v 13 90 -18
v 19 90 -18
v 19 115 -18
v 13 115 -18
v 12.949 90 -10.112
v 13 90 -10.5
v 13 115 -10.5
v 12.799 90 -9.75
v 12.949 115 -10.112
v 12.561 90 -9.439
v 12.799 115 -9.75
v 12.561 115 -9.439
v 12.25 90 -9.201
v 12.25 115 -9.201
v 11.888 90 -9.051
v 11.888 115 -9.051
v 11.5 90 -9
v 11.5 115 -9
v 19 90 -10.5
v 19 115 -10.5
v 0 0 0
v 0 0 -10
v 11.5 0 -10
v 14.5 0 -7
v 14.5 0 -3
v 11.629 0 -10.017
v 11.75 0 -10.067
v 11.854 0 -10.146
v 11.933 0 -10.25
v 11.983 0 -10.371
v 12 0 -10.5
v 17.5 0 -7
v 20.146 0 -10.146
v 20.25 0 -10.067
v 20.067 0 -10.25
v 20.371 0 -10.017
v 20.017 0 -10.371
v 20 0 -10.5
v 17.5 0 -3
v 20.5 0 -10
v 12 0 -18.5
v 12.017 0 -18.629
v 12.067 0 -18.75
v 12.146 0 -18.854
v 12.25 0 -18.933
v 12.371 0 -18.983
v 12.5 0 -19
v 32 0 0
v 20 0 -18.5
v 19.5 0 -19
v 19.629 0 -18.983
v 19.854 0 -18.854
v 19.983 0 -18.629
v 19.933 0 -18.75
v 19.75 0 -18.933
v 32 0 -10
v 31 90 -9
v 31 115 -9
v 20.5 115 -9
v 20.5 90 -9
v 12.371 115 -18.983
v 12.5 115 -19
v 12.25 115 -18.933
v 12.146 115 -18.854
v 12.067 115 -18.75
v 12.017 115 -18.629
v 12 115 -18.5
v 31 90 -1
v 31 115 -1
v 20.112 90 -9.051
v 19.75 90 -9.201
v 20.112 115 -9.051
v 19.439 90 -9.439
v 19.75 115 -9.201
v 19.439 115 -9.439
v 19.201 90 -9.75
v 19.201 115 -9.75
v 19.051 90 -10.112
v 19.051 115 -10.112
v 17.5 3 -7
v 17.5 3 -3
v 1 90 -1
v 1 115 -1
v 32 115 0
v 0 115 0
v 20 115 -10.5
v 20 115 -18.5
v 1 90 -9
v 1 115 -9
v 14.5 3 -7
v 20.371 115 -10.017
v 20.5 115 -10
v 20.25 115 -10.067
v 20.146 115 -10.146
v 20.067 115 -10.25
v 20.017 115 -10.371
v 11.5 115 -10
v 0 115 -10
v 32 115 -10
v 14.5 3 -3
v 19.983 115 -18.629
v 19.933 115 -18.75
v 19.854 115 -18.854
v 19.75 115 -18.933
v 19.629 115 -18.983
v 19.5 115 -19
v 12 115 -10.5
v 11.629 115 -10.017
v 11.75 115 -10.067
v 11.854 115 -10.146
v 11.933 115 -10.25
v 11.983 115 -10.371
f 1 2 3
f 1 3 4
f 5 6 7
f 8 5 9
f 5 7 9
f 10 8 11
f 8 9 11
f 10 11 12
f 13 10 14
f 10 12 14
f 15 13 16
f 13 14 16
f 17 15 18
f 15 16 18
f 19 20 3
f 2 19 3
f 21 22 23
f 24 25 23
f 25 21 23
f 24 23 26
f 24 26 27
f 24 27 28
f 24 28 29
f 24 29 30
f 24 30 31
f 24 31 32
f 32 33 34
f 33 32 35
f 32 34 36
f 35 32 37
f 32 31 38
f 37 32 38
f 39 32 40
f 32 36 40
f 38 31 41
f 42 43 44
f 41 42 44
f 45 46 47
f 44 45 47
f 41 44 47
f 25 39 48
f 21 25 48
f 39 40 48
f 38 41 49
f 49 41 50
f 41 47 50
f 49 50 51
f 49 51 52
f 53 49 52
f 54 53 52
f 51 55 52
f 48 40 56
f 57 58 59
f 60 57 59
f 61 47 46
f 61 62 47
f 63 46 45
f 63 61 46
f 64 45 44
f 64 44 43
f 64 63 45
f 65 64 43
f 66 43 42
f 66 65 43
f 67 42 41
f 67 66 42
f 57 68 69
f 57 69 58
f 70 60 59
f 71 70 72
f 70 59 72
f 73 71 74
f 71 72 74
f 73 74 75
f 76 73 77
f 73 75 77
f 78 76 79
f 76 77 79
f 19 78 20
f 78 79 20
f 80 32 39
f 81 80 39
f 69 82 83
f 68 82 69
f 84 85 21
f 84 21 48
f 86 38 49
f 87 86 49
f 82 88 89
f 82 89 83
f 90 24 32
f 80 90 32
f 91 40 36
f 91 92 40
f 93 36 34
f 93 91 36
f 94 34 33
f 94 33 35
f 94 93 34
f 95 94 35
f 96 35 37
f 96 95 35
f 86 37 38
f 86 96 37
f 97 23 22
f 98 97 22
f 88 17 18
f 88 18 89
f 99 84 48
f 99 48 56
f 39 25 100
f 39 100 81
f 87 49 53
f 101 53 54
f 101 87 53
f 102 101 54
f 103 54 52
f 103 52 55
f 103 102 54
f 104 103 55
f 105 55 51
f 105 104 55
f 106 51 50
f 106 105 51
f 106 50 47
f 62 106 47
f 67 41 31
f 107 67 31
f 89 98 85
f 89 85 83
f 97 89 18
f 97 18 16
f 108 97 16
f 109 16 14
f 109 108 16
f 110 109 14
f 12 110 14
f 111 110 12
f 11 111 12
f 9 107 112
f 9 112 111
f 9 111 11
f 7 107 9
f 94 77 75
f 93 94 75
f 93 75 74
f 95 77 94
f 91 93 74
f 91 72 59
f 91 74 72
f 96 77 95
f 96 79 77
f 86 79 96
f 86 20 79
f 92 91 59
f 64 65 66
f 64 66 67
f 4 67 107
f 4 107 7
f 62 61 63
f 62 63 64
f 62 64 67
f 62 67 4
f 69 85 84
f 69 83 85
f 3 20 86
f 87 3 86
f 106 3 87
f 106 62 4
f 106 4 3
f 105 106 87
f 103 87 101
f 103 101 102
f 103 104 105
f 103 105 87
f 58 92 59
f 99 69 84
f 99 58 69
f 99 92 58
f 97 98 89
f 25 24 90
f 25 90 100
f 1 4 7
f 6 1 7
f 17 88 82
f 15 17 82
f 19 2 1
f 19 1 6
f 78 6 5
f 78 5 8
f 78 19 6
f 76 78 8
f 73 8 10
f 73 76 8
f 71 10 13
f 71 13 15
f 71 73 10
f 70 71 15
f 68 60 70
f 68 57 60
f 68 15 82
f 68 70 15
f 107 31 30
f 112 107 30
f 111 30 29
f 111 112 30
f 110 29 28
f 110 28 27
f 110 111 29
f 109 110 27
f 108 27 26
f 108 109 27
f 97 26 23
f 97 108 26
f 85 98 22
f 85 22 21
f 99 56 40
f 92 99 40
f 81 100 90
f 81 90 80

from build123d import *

# Parameters (mm, degrees)
BOSS_EXTRUDE1_DEPTH      = 115
FILLET1_R                = 0.5
SHELL1_T                 = -1
SHELL1_THICKNESS_2_DEPTH = 89
SKETCH2_W                = 3
SKETCH2_H                = 4
CUT_EXTRUDE1_DEPTH       = 3


with BuildPart() as part:
    # Sketch1 → Boss-Extrude1 (new body)
    with BuildSketch(Plane(origin=(0, 0, 0), x_dir=(1, 0, 0), z_dir=(0, 1, 0))):
        Polygon((0, 0), (32, 0), (32, 10), (20, 10), (20, 19), (12, 19), (12, 10), (0, 10), align=None)
    extrude(amount=BOSS_EXTRUDE1_DEPTH)

    # Fillet1
    fillet1_edges = [part.edges().sort_by_distance(p)[0] for p in [
        (12, 57.5, -10),
        (12, 57.5, -19),
        (20, 57.5, -19),
        (20, 57.5, -10),
    ]]
    fillet(fillet1_edges, radius=FILLET1_R)

    # Shell1
    shell1_openings = [part.faces().sort_by_distance(p)[0] for p in [
        (16, 115, -6.742495559),
    ]]
    offset(amount=SHELL1_T, openings=shell1_openings)

    # Shell1 thickness 2 face (on inner face of the shell) → Shell1 thickness 2 (add)
    with BuildSketch(Plane(origin=(16, 1, -6.570305912), x_dir=(0, 0, -1), z_dir=(0, -1, 0))):
        with BuildLine():
            ThreePointArc((2.429694088, 4.5), (2.869033916, 3.439339828), (3.929694088, 3))
            Line((3.929694088, 3), (11.429694088, 3))
            Line((11.429694088, 3), (11.429694088, -3))
            Line((11.429694088, -3), (3.929694088, -3))
            ThreePointArc((3.929694088, -3), (2.869033916, -3.439339828), (2.429694088, -4.5))
            Line((2.429694088, -4.5), (2.429694088, -15))
            Line((2.429694088, -15), (-5.570305912, -15))
            Line((-5.570305912, -15), (-5.570305912, 15))
            Line((-5.570305912, 15), (2.429694088, 15))
            Line((2.429694088, 15), (2.429694088, 4.5))
        make_face()
    extrude(amount=-SHELL1_THICKNESS_2_DEPTH)

    # Sketch2 → Cut-Extrude1 (cut)
    with BuildSketch(Plane.XZ):
        with Locations((16, -5)):
            Rectangle(SKETCH2_W, SKETCH2_H)
    extrude(amount=-CUT_EXTRUDE1_DEPTH, mode=Mode.SUBTRACT)


solid = part.part
